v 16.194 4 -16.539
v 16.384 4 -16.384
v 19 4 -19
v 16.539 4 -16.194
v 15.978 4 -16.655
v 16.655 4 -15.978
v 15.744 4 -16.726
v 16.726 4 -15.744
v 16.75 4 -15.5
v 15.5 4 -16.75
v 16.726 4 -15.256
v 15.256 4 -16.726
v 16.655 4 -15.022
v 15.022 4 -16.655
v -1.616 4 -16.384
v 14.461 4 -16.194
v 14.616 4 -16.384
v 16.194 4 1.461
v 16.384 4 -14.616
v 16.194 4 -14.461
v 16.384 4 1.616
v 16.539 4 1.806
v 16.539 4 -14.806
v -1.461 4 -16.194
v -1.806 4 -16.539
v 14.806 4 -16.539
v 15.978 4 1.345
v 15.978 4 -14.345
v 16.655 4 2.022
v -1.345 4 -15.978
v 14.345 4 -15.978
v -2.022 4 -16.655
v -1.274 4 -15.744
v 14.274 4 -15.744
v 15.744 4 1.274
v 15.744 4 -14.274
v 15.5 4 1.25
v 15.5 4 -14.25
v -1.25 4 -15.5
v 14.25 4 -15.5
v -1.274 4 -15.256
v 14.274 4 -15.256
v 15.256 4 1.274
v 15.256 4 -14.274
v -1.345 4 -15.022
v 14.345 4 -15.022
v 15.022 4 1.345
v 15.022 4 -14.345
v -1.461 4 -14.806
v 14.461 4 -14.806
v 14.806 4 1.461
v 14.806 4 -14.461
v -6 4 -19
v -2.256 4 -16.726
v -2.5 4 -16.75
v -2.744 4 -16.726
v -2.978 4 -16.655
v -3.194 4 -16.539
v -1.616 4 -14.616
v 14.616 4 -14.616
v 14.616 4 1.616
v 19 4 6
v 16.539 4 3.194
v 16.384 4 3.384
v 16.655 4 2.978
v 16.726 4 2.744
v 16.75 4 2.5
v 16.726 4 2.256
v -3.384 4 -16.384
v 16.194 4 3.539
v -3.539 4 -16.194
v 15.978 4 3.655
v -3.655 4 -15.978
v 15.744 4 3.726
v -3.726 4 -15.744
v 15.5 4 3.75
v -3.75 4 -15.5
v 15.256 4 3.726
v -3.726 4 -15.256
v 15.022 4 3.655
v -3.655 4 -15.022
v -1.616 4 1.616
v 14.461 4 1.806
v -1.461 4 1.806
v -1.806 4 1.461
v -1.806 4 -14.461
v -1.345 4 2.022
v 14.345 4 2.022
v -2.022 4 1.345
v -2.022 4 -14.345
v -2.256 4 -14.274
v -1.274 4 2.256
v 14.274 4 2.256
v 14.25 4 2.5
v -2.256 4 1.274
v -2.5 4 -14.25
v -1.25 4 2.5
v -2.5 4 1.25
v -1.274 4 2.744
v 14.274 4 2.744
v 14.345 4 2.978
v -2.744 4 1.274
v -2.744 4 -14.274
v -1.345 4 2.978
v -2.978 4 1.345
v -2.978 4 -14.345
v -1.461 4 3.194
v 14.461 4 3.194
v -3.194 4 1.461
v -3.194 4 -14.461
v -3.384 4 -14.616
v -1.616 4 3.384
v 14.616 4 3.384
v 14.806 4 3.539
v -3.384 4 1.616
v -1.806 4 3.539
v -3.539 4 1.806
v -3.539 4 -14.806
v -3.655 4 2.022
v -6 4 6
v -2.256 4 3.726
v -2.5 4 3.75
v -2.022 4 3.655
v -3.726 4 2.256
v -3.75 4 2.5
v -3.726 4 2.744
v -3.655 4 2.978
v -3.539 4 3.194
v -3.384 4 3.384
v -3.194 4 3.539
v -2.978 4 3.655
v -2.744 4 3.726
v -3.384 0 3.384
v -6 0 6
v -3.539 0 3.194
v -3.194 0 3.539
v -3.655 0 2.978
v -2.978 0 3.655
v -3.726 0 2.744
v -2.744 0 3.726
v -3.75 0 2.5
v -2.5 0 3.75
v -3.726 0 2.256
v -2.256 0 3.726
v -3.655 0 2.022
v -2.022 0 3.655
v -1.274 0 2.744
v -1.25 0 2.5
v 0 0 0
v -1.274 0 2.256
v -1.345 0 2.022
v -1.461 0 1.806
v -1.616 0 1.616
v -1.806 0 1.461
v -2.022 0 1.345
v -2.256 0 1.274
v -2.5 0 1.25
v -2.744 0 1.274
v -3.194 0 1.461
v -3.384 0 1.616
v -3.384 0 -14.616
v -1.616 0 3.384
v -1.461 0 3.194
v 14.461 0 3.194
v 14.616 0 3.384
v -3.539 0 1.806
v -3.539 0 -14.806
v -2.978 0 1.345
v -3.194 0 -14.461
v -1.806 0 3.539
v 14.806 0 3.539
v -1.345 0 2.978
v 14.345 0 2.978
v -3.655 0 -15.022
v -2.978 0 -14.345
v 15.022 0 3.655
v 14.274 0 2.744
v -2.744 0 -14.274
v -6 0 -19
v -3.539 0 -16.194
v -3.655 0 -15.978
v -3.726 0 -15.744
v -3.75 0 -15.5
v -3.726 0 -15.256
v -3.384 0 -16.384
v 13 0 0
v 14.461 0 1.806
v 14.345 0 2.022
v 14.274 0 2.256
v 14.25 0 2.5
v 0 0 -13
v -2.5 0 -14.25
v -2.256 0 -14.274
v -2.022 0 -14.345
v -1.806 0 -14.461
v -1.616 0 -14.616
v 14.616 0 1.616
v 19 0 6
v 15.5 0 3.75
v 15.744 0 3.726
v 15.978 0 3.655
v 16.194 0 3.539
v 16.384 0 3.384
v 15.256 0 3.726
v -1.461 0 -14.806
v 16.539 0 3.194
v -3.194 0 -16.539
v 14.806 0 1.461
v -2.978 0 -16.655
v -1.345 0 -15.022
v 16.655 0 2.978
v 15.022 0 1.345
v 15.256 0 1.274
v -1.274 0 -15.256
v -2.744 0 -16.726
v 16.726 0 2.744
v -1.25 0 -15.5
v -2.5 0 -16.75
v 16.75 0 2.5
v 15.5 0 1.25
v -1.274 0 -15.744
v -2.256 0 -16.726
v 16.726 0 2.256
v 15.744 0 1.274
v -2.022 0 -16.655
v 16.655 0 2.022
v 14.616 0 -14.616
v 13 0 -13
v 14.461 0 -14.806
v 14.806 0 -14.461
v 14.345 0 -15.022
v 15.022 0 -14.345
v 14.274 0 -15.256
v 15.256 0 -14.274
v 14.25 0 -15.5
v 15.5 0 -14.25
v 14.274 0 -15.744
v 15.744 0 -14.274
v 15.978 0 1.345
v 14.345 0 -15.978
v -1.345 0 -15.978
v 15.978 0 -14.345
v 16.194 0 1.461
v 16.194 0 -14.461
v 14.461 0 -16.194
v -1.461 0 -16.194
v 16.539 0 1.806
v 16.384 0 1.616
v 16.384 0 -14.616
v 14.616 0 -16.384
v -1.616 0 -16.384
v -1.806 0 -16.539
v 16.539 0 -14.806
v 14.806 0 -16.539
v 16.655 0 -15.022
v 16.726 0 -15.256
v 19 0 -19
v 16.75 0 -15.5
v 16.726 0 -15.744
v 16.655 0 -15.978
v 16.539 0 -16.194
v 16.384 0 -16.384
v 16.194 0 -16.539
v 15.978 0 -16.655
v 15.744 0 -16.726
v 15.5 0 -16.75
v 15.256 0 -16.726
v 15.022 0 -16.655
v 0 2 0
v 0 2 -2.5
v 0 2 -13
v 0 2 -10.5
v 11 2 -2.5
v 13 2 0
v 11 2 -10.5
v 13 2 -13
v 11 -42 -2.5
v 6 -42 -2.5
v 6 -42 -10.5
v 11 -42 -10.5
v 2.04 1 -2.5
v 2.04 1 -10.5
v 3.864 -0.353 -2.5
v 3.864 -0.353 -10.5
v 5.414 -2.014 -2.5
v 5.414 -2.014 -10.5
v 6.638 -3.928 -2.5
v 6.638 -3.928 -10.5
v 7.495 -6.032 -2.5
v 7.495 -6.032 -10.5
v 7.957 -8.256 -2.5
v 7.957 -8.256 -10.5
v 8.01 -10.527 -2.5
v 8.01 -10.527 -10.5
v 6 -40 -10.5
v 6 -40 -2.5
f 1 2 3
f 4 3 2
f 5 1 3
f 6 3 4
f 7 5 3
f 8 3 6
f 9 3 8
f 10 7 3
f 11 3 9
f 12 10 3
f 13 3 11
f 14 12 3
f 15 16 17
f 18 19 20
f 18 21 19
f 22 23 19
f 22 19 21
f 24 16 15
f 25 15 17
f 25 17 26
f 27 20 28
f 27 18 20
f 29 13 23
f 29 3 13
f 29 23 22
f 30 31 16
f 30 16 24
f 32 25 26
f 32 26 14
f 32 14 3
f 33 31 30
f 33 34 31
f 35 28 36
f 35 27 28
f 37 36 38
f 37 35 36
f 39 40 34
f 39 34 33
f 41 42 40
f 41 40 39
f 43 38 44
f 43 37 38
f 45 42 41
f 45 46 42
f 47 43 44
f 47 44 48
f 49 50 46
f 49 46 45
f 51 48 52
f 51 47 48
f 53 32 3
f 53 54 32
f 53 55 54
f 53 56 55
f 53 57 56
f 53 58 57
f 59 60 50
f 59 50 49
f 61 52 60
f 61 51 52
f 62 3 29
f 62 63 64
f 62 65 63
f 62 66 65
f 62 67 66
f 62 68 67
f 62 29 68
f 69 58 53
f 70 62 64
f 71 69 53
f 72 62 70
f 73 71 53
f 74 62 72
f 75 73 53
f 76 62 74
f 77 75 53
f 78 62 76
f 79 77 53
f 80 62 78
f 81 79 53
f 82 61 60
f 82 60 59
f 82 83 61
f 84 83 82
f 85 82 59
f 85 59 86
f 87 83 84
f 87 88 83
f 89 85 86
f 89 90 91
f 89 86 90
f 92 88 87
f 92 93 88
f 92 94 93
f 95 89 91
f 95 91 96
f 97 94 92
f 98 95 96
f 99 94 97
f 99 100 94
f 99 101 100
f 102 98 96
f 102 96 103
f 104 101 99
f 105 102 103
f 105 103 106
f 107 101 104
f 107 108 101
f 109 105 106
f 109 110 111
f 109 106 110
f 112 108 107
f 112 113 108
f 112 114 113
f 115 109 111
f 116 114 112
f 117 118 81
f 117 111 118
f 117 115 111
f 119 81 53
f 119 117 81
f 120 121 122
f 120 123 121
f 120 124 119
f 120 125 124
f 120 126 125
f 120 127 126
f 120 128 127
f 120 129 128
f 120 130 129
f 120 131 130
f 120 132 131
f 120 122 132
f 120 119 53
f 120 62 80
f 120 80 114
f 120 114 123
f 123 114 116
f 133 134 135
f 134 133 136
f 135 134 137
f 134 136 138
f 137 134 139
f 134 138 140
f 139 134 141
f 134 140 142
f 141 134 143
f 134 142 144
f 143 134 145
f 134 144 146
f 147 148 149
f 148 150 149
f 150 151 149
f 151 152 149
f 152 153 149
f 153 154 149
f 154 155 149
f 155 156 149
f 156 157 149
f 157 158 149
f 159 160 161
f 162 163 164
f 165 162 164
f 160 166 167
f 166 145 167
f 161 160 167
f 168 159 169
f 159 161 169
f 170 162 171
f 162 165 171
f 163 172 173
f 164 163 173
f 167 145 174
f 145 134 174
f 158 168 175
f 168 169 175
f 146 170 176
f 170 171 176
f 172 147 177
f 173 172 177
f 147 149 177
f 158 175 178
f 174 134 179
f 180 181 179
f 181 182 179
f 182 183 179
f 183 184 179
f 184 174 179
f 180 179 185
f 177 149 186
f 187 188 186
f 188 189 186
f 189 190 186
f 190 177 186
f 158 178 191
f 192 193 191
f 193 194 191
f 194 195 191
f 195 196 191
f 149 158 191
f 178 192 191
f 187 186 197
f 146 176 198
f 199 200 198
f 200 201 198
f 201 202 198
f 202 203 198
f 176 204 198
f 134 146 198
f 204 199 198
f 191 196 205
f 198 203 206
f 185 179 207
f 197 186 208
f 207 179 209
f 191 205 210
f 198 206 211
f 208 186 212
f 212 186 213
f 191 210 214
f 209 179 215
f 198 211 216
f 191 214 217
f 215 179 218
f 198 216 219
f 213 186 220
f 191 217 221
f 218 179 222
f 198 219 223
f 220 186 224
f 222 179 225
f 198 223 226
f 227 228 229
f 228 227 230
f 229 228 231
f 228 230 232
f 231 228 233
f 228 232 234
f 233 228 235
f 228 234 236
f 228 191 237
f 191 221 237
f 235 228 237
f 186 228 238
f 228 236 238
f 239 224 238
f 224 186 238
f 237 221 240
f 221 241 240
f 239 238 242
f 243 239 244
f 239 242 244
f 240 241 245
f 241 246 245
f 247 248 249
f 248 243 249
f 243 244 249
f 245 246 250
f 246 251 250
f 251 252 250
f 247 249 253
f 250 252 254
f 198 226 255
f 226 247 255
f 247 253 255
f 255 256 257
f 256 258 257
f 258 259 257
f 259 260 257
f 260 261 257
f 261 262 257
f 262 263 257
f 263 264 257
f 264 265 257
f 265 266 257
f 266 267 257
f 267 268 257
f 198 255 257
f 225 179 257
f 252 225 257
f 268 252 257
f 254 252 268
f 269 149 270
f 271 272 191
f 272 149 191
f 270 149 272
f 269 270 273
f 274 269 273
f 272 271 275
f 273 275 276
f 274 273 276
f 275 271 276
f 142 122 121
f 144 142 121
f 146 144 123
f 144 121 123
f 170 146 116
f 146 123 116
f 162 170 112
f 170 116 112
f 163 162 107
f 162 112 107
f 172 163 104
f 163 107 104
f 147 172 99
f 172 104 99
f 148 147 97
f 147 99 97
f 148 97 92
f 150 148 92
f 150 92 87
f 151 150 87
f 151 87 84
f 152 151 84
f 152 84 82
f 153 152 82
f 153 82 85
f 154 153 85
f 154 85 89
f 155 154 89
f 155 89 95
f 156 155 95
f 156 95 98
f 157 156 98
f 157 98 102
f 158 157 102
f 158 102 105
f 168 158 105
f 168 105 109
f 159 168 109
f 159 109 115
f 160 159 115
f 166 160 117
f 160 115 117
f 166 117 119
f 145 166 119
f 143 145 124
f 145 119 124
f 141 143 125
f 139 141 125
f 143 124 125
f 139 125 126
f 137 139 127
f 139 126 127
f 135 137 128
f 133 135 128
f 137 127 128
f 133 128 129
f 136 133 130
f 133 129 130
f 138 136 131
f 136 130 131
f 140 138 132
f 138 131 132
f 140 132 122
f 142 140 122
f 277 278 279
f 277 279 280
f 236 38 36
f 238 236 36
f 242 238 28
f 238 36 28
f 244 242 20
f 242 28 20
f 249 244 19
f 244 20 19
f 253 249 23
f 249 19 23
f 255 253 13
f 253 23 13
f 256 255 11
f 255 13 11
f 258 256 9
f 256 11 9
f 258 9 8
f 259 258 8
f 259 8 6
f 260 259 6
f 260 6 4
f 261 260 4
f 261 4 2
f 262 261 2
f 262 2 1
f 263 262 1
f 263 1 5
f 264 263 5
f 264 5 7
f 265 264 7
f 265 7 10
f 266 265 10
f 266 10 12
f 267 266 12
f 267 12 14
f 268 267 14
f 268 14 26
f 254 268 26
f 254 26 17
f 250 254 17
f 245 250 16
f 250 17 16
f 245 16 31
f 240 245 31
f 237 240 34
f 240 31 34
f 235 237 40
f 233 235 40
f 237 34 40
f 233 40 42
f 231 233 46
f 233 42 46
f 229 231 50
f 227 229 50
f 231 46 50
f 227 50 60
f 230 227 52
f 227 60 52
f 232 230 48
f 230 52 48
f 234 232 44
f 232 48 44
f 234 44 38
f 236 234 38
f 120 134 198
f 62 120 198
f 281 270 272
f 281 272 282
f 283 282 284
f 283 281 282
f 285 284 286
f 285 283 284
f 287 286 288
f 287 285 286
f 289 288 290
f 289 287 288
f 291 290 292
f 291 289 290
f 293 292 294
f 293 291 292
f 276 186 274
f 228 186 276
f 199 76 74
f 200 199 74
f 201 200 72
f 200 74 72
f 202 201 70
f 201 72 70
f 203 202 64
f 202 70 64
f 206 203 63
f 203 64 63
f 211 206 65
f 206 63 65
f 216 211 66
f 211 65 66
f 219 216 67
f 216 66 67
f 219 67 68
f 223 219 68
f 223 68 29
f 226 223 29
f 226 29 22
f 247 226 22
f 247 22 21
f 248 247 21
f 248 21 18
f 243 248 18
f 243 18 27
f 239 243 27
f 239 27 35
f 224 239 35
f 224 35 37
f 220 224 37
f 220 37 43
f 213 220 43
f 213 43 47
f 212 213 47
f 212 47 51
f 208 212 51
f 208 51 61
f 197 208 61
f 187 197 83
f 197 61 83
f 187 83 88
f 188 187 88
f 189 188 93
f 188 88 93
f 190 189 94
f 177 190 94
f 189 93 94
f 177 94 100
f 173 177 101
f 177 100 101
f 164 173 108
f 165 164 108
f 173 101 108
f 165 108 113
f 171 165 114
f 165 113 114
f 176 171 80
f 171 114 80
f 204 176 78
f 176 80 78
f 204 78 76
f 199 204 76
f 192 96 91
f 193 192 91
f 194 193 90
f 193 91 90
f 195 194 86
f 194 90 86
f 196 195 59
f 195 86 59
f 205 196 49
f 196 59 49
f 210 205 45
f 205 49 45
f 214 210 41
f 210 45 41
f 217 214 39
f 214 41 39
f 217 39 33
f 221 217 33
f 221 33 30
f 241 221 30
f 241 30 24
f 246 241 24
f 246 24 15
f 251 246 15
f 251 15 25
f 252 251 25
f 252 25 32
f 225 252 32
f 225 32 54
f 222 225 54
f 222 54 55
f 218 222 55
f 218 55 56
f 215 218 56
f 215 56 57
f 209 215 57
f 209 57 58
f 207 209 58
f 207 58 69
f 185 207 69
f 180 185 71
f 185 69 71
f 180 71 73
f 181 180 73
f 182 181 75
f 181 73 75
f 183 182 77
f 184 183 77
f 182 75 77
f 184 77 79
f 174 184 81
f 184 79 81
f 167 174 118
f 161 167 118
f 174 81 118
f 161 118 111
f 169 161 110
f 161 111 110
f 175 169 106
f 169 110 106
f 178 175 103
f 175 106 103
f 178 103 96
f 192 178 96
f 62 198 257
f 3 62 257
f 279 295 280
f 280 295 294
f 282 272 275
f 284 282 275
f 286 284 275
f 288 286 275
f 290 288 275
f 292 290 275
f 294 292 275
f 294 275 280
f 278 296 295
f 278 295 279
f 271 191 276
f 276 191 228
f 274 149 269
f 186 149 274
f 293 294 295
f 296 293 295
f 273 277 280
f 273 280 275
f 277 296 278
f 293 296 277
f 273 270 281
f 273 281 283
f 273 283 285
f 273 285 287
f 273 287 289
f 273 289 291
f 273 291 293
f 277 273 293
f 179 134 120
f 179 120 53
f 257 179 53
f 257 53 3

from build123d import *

# Parameters (mm, degrees)
SKETCH_1_W           = 25
SKETCH_1_H           = 25
SKETCH_1_W_2         = 13
SKETCH_1_H_2         = 13
EXTRUDE_1_DEPTH      = 4
EXTRUDE_5_DEPTH      = 4
EXTRUDE_5_DEPTH_BACK = 4
EXTRUDE_6_DEPTH      = 8
EXTRUDE_7_DEPTH      = 8
SKETCH_10_W          = 13
SKETCH_10_H          = 13.001688454
EXTRUDE_8_DEPTH      = 2
SKETCH_11_R          = 1.25
CUT_EXTRUDE_1_DEPTH  = 54.272882407


with BuildPart() as part:
    # Эскиз1 → Бобышка-Вытянуть1 (new body)
    with BuildSketch(Plane(origin=(0, 0, 0), x_dir=(1, 0, 0), z_dir=(0, 1, 0))):
        with Locations((6.5, 6.5)):
            Rectangle(SKETCH_1_W, SKETCH_1_H)
        with Locations((6.5, 6.5)):
            Rectangle(SKETCH_1_W_2, SKETCH_1_H_2, mode=Mode.SUBTRACT)
    extrude(amount=EXTRUDE_1_DEPTH)

    # Эскиз6 → Бобышка-Вытянуть5 (add, two sides: drawn at the far end of the back side and taken through both)
    with BuildSketch(Plane(origin=(0, 0, -6.5), x_dir=(-1, 0, 0), z_dir=(0, 0, -1)).offset(-EXTRUDE_5_DEPTH_BACK)):
        Polygon((-13, 4), (-9, 4), (-9, -40), (-6, -40), (-6, -42), (-11, -42), (-11, 2), (-13, 2), align=None)
    extrude(amount=EXTRUDE_5_DEPTH + EXTRUDE_5_DEPTH_BACK)

    # Эскиз7 → Бобышка-Вытянуть6 (add)
    with BuildSketch(Plane(origin=(0, 0, -10.5), x_dir=(-1, 0, 0), z_dir=(0, 0, -1))):
        Polygon((-9, -40), (-9, 4), (-6, -40), align=None)
    extrude(amount=-EXTRUDE_6_DEPTH)

    # Эскиз9 → Бобышка-Вытянуть7 (add)
    with BuildSketch(Plane.XY.offset(-2.5)):
        with BuildLine():
            Line((9, 4), (0, 4))
            Line((0, 4), (0, 2))
            ThreePointArc((0, 2), (6.069824399, -2.94312486), (8.009524283, -10.526977177))
            Line((8.009524283, -10.526977177), (9, 4))
        make_face()
    extrude(amount=-EXTRUDE_7_DEPTH)

    # Эскиз10 → Бобышка-Вытянуть8 (add)
    with BuildSketch(Plane(origin=(0, 4, 0), x_dir=(1, 0, 0), z_dir=(0, 1, 0))):
        with Locations((6.5, 6.499155773)):
            Rectangle(SKETCH_10_W, SKETCH_10_H)
    extrude(amount=-EXTRUDE_8_DEPTH)

    # Эскиз11 → Вырез-Вытянуть1 (cut, through all)
    with BuildSketch(Plane(origin=(0, 4, 0), x_dir=(1, 0, 0), z_dir=(0, 1, 0))):
        with Locations(Location((-2.5, 15.5, 0), (0, 0, 270))):
            Circle(SKETCH_11_R)
        with Locations(Location((15.5, 15.5, 0), (0, 0, 270))):
            Circle(SKETCH_11_R)
        with Locations(Location((-2.5, -2.5, 0), (0, 0, 270))):
            Circle(SKETCH_11_R)
        with Locations(Location((15.5, -2.5, 0), (0, 0, 270))):
            Circle(SKETCH_11_R)
    extrude(amount=-CUT_EXTRUDE_1_DEPTH, mode=Mode.SUBTRACT)


solid = part.part
